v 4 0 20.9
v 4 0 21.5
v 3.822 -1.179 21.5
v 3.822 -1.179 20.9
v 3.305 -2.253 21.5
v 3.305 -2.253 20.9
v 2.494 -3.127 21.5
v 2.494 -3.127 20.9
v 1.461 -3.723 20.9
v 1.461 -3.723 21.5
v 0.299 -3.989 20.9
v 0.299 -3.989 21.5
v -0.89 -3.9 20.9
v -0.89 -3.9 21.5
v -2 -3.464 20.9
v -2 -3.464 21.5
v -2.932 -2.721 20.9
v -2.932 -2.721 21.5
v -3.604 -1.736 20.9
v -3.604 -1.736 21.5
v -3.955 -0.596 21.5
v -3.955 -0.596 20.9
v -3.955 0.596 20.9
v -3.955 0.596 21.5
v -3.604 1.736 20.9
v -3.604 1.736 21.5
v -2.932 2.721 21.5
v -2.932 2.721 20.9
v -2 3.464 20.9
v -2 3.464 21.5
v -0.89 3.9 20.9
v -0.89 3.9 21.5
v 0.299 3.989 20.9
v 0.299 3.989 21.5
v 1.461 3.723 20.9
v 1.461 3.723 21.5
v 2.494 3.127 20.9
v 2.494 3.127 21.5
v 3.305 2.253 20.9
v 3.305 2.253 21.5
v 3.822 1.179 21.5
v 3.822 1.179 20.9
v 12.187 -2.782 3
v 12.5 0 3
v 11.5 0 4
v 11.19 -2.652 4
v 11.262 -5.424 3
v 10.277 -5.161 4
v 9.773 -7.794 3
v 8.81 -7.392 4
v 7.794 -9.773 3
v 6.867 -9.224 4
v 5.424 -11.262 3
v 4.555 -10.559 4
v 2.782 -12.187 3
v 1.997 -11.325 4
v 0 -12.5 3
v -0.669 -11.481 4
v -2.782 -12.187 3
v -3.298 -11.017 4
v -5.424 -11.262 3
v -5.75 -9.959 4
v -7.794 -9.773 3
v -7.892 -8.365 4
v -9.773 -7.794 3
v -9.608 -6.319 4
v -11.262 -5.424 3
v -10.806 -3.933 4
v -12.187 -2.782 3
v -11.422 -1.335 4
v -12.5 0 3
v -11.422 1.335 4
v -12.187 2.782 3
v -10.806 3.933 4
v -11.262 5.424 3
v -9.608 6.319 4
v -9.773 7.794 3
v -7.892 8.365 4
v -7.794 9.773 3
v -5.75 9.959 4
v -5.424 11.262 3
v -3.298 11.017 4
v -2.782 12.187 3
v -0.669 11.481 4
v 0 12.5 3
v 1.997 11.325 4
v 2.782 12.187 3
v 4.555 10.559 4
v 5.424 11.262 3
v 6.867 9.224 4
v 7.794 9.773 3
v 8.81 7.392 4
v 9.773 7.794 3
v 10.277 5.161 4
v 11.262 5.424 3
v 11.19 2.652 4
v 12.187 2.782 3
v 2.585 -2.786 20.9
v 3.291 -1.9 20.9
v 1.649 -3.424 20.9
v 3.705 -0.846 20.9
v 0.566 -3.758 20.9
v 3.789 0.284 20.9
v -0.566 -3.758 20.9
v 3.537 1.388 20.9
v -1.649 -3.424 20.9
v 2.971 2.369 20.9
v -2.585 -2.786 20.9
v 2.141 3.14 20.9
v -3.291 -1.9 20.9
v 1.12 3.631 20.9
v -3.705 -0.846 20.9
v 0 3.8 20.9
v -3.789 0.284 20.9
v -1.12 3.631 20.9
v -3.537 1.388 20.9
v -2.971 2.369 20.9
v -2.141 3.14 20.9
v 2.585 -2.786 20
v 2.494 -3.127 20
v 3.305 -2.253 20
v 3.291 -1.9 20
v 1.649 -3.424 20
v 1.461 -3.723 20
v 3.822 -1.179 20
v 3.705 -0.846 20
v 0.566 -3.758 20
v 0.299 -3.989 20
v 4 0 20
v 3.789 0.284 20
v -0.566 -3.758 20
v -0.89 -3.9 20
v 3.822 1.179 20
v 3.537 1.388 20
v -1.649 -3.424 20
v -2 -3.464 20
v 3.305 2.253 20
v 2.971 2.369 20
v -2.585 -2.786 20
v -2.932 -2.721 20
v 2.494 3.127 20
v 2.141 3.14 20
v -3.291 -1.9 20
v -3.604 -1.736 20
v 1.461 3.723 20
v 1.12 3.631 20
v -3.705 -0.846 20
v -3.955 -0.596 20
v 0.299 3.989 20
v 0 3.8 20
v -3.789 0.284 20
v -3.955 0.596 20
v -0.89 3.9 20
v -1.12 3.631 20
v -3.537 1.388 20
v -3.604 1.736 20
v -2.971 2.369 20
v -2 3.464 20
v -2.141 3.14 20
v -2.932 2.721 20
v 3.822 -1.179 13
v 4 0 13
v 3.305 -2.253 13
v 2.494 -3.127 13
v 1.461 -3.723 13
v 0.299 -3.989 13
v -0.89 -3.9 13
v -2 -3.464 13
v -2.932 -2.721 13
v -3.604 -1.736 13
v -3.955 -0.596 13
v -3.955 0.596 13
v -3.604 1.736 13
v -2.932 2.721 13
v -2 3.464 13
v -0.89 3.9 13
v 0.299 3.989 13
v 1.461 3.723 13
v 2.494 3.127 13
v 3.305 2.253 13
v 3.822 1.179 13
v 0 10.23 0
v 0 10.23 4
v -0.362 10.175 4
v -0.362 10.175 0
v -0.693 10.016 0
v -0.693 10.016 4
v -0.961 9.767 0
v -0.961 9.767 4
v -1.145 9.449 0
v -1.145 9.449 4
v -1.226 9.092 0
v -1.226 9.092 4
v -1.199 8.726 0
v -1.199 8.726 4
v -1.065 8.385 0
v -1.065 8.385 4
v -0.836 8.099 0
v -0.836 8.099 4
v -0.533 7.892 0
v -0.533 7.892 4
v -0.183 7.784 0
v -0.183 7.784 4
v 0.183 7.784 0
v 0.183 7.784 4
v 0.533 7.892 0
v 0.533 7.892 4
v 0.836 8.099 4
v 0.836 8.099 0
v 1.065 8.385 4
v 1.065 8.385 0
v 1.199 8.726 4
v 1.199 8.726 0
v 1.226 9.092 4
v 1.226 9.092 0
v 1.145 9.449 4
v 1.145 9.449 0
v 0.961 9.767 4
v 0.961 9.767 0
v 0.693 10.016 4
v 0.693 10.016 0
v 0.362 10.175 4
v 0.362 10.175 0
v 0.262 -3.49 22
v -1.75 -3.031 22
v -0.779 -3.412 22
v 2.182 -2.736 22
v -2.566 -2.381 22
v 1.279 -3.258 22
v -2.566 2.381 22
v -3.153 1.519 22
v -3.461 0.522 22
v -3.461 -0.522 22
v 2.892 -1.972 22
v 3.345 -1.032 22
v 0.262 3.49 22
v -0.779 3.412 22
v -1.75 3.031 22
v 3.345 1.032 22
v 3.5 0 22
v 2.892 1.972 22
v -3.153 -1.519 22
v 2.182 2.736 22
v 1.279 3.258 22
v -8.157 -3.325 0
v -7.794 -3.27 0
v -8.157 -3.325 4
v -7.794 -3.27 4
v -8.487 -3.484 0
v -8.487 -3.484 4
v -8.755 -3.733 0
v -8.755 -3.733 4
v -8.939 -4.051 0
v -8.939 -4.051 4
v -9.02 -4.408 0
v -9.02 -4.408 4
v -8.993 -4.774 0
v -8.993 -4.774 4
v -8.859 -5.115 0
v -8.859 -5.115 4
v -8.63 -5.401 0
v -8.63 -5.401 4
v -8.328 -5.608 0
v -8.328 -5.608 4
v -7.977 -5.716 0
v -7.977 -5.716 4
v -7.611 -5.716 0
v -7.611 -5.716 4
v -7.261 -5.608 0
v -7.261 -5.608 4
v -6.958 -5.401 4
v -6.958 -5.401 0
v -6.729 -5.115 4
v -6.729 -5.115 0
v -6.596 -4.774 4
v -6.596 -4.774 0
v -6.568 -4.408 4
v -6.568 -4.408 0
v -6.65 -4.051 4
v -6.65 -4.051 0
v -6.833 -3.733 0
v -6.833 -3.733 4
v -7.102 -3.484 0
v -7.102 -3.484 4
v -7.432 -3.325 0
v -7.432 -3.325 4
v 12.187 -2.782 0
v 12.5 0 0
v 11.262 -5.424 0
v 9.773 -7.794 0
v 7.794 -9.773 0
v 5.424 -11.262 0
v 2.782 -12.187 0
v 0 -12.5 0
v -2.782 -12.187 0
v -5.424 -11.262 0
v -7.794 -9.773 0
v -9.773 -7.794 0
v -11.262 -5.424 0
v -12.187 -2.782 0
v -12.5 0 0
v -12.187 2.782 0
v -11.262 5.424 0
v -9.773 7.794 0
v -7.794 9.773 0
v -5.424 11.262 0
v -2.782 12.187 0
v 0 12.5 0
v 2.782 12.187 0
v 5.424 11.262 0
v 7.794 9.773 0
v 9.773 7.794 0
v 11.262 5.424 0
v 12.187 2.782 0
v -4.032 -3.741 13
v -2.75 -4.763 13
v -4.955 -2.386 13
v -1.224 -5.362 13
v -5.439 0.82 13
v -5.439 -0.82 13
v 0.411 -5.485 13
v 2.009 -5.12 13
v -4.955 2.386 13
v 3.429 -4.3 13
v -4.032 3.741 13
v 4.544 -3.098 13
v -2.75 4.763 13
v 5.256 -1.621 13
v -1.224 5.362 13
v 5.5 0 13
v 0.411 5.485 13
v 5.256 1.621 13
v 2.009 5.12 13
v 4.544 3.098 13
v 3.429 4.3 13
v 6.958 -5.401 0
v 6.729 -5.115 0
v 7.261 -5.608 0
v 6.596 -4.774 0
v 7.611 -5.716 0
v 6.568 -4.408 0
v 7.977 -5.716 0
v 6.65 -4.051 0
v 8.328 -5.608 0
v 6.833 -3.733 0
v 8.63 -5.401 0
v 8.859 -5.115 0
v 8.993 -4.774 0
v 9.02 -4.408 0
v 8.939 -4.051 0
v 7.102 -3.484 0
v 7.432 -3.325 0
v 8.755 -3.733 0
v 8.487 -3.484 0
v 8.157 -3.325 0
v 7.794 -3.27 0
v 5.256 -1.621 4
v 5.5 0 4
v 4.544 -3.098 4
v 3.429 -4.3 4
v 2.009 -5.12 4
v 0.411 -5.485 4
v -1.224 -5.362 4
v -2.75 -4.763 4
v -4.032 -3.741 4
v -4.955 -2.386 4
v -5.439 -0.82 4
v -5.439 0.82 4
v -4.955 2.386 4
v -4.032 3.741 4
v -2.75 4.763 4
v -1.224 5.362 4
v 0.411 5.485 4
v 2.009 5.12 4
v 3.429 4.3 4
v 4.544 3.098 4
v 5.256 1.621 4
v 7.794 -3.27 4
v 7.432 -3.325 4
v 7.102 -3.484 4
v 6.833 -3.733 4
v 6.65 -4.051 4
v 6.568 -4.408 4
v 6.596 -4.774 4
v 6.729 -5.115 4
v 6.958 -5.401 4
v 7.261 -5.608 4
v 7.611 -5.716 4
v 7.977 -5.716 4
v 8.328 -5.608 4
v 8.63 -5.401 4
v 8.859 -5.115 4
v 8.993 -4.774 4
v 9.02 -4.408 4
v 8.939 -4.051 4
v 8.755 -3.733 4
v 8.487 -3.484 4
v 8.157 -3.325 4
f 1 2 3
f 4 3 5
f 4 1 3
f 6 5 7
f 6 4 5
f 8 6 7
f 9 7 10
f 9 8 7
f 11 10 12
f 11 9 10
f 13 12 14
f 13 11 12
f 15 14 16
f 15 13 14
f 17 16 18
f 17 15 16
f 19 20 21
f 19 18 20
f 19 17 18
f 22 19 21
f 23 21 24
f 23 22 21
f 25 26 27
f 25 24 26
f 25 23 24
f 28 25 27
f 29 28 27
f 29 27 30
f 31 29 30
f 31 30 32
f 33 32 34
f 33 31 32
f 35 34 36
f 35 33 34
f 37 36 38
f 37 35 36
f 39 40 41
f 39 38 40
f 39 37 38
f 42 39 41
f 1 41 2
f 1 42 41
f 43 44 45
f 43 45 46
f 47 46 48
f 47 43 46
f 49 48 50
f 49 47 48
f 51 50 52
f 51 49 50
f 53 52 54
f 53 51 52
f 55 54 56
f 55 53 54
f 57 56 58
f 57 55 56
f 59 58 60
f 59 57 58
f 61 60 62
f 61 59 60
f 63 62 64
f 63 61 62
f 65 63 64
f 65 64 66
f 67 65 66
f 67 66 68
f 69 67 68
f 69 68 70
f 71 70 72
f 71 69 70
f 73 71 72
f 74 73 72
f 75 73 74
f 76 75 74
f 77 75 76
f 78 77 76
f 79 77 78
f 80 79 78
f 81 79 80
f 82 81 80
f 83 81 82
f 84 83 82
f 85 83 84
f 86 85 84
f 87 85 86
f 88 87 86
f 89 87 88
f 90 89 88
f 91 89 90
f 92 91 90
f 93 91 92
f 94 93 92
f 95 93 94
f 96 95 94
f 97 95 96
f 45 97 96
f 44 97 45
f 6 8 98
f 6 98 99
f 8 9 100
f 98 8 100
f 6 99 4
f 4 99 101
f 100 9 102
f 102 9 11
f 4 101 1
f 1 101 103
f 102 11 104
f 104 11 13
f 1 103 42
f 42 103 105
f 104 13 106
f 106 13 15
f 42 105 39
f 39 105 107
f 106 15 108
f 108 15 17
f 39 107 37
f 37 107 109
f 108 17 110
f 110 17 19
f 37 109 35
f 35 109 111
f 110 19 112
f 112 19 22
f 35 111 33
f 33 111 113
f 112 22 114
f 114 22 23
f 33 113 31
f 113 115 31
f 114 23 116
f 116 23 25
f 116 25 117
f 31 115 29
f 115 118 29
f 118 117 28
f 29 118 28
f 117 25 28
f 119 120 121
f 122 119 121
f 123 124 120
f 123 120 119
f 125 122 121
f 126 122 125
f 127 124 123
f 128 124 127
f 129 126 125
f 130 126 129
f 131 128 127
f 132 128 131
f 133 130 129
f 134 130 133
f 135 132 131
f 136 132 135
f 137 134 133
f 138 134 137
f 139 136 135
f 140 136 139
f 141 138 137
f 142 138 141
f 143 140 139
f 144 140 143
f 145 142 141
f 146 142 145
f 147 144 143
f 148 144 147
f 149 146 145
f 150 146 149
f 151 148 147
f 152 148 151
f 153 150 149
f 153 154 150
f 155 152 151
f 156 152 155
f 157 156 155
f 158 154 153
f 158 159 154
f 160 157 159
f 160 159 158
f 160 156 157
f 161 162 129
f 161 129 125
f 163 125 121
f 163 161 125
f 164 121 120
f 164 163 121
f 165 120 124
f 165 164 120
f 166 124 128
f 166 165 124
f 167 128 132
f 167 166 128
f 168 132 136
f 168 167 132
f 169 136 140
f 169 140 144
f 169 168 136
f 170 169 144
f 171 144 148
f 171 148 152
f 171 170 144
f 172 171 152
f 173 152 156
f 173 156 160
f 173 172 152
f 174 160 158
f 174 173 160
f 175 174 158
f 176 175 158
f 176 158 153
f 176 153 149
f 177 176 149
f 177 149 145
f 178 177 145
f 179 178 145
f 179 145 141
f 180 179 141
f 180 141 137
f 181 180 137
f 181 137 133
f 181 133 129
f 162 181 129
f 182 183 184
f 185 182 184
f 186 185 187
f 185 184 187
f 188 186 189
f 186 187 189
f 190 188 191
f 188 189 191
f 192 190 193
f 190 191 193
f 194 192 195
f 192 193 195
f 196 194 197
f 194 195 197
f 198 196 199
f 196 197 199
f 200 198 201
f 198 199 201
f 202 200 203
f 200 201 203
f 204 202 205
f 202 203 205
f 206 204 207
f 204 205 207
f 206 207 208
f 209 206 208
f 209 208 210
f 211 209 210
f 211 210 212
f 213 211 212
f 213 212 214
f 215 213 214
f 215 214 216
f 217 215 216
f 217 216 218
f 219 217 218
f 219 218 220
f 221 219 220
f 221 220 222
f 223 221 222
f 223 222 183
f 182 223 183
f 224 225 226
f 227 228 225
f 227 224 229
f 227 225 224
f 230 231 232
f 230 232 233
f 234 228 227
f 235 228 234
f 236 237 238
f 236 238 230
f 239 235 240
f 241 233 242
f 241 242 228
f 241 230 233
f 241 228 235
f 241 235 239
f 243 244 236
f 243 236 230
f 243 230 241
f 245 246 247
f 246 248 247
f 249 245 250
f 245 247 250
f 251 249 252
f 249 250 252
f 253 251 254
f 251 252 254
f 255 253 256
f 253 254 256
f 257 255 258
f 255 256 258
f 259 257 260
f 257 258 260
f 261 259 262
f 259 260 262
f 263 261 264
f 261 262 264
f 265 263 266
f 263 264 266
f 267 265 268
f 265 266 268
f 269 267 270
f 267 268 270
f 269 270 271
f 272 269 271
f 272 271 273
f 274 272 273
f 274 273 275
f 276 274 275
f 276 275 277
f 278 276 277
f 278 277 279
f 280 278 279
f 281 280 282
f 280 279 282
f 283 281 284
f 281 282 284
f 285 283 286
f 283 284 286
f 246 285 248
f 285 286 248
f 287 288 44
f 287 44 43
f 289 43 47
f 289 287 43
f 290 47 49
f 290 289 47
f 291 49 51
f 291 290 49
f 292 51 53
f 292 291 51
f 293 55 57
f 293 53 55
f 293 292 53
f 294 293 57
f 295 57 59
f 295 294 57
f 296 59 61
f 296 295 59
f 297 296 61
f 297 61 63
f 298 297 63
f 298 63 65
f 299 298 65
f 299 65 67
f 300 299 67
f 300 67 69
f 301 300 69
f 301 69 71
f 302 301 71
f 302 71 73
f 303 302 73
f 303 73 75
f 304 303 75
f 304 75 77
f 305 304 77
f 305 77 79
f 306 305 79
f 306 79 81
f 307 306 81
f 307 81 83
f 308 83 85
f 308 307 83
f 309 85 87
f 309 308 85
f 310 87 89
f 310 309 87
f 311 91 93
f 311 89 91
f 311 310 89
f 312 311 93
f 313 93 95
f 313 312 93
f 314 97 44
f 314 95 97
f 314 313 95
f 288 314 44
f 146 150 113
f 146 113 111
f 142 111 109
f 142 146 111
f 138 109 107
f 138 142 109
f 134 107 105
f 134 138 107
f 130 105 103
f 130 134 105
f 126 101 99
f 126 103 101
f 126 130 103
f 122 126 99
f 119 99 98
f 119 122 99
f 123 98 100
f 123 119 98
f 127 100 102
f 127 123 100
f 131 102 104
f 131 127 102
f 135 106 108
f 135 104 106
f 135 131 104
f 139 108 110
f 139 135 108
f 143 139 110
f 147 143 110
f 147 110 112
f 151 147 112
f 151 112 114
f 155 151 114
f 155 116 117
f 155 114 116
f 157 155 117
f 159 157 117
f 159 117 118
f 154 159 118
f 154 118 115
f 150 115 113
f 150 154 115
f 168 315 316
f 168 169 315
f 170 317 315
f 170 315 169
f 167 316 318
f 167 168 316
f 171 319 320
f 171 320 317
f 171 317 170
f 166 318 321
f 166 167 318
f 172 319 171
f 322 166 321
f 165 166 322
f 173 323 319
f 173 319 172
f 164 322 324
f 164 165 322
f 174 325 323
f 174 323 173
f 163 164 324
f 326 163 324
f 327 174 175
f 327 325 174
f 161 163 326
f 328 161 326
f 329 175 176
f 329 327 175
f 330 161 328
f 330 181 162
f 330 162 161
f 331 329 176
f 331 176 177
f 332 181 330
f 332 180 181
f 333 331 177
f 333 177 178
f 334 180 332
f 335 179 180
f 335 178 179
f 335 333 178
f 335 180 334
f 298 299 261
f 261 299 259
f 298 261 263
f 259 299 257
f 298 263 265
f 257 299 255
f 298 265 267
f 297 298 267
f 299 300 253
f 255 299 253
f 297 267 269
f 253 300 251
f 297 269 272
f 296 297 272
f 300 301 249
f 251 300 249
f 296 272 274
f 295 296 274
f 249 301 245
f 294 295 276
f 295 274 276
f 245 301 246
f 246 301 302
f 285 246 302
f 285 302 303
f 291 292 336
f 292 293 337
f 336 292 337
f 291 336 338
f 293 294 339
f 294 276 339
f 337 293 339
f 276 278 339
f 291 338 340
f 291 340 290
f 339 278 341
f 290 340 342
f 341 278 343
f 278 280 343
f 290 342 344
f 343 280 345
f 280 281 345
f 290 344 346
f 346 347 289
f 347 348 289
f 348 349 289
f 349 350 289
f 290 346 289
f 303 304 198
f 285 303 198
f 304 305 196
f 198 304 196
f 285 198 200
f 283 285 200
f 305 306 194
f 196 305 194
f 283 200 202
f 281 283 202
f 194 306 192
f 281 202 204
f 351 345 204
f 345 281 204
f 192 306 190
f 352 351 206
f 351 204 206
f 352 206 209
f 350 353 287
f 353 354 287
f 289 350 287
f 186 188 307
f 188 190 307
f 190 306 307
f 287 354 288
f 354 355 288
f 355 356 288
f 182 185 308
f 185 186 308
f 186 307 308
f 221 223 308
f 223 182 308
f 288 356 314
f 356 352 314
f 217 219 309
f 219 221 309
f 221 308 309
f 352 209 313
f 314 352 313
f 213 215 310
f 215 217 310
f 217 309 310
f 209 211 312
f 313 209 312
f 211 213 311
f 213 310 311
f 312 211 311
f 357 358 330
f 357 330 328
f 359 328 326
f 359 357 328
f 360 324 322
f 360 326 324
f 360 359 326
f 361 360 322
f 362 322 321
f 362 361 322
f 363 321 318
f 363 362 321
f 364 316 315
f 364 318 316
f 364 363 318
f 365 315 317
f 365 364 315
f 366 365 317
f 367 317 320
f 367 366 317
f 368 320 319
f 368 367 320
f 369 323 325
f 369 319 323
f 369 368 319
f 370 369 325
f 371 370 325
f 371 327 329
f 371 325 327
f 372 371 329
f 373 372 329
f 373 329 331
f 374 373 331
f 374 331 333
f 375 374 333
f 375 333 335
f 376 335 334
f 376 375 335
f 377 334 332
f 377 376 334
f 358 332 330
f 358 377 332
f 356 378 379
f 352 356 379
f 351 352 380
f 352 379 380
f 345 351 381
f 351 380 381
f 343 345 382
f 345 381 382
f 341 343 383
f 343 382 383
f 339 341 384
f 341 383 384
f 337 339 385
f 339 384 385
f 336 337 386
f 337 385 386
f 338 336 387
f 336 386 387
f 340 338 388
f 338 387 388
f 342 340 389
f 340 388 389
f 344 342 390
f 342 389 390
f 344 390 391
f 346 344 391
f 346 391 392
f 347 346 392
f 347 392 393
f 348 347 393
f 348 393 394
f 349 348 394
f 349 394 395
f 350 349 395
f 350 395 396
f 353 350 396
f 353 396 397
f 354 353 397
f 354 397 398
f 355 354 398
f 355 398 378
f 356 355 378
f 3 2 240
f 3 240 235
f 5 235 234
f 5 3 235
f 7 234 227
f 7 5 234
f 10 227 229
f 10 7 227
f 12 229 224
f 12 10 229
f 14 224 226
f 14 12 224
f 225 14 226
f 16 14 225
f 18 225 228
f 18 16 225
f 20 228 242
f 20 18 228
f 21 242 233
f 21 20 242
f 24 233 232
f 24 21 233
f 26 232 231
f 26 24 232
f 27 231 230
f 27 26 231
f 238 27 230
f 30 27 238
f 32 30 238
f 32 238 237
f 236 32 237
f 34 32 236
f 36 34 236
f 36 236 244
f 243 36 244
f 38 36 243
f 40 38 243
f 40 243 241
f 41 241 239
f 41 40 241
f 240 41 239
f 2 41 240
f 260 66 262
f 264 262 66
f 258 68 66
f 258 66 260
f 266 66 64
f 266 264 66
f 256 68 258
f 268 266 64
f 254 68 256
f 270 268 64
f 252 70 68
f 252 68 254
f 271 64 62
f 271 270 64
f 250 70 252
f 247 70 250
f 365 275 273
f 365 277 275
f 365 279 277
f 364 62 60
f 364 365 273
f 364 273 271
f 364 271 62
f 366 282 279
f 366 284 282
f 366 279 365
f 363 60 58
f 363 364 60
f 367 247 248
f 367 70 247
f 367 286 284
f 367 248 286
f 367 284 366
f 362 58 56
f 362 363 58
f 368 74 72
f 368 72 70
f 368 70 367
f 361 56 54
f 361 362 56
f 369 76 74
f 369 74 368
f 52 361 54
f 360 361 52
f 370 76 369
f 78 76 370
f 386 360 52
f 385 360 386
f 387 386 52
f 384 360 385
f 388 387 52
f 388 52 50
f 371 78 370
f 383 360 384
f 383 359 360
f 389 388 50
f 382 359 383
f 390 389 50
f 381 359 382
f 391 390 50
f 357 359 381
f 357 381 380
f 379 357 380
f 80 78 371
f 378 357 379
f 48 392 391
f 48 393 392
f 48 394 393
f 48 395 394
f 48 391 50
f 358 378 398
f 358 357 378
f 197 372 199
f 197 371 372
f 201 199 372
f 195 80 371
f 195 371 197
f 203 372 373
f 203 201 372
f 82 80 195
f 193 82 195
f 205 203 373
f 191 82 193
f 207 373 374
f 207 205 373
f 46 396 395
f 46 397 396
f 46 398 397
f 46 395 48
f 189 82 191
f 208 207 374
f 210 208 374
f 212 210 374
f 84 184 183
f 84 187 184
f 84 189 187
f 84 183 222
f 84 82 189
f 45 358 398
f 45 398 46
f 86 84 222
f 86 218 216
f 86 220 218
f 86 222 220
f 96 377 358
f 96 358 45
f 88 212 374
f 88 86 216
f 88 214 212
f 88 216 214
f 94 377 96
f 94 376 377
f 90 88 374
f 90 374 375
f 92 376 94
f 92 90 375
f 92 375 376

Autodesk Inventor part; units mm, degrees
ref_plane "YZ Plane" through (0, 0, 0) normal (1, 0, 0) x (0, 1, 0)
ref_plane "XZ Plane" through (0, 0, 0) normal (0, 1, 0) x (-1, 0, 0)
ref_plane "XY Plane" through (0, 0, 0) normal (0, 0, 1) x (1, 0, 0)
sketch "Skizze1" plane through (0, 0, 0) normal (0, 0, 1) x (1, 0, 0)
  circle A0 centre (0, 0) radius 12.5
  dimension "d0" = 25
extrude "Extrusion1" add sketch "Skizze1" along normal blind 4
sketch "Skizze2" plane through (0, 0, 4) normal (0, 0, 1) x (1, 0, 0)
  circle A0 centre (0, 0) radius 12.5 projected
  circle A1 centre (0, 0) radius 5.5
  dimension "d3" = 11
extrude "Extrusion2" add sketch "Skizze2" along normal blind 9 contours A1
sketch "Skizze3" plane through (0, 0, 13) normal (0, 0, 1) x (1, 0, 0)
  circle A0 centre (0, 0) radius 5.5 projected
  circle A1 centre (0, 0) radius 4
  dimension "d6" = 8
extrude "Extrusion3" add sketch "Skizze3" along normal blind 9 contours A1
sketch "Skizze4" plane through (0, 0, 0) normal (0, 0, -1) x (-1, 0, 0)
  circle A0 centre (0, 0) radius 12.5 projected
  line L0 (17.5, 0) -> (-17.5, 0) projected
  line L1 (0, -17.5) -> (0, 17.5) projected
  circle A1 centre (0, 0) radius 9
  line L2 (7.7942, -4.5) -> (0, 0)
  line L3 (0, 0) -> (-7.7942, -4.5)
  point P0 (0, 9)
  dimension "d9" = 18
  dimension "d10" = 120
  dimension "d11" = 120
hole "Bohrung1" at (0, 9, 0) at (-7.7942, -4.5, 0) at (7.7942, -4.5, 0) direction (0, 0, 1) diameter 2.459 end through all thread size "M3x0.5" class "6H" standard "ISO Metric profile"
chamfer "Fase1" distance 0.5 angle 45 1 edges at (-4, 0, 22)
sketch "Skizze5" plane through (0, 0, 0) normal (1, 0, 0) x (0, 1, 0)
  line L0 (-4, 13) -> (4, 13) projected
  line L1 (4, 21.5) -> (-4, 21.5) projected
  line L2 (4, 13) -> (4, 21.5) projected
  line L3 (0, -4.3) -> (0, 25.8) projected
  line L4 (4, 20.9) -> (3.8, 20.9)
  line L5 (3.8, 20.9) -> (3.8, 20)
  line L6 (3.8, 20) -> (4, 20)
  line L7 (4, 20) -> (4, 20.9)
  point P0 (0, 0)
  dimension "d31" = 7
  dimension "d32" = 0.9
  dimension "d33" = 7.6
revolve "Umdrehung1" cut sketch "Skizze5" angle 360 about axis through (0, 0, -10) along (0, 0, 1) contours L6 L5 L4 L2
chamfer "Fase3" distance 1 angle 45 1 edges at (-12.5, 0, 4)
properties part number "1_0204_005"
